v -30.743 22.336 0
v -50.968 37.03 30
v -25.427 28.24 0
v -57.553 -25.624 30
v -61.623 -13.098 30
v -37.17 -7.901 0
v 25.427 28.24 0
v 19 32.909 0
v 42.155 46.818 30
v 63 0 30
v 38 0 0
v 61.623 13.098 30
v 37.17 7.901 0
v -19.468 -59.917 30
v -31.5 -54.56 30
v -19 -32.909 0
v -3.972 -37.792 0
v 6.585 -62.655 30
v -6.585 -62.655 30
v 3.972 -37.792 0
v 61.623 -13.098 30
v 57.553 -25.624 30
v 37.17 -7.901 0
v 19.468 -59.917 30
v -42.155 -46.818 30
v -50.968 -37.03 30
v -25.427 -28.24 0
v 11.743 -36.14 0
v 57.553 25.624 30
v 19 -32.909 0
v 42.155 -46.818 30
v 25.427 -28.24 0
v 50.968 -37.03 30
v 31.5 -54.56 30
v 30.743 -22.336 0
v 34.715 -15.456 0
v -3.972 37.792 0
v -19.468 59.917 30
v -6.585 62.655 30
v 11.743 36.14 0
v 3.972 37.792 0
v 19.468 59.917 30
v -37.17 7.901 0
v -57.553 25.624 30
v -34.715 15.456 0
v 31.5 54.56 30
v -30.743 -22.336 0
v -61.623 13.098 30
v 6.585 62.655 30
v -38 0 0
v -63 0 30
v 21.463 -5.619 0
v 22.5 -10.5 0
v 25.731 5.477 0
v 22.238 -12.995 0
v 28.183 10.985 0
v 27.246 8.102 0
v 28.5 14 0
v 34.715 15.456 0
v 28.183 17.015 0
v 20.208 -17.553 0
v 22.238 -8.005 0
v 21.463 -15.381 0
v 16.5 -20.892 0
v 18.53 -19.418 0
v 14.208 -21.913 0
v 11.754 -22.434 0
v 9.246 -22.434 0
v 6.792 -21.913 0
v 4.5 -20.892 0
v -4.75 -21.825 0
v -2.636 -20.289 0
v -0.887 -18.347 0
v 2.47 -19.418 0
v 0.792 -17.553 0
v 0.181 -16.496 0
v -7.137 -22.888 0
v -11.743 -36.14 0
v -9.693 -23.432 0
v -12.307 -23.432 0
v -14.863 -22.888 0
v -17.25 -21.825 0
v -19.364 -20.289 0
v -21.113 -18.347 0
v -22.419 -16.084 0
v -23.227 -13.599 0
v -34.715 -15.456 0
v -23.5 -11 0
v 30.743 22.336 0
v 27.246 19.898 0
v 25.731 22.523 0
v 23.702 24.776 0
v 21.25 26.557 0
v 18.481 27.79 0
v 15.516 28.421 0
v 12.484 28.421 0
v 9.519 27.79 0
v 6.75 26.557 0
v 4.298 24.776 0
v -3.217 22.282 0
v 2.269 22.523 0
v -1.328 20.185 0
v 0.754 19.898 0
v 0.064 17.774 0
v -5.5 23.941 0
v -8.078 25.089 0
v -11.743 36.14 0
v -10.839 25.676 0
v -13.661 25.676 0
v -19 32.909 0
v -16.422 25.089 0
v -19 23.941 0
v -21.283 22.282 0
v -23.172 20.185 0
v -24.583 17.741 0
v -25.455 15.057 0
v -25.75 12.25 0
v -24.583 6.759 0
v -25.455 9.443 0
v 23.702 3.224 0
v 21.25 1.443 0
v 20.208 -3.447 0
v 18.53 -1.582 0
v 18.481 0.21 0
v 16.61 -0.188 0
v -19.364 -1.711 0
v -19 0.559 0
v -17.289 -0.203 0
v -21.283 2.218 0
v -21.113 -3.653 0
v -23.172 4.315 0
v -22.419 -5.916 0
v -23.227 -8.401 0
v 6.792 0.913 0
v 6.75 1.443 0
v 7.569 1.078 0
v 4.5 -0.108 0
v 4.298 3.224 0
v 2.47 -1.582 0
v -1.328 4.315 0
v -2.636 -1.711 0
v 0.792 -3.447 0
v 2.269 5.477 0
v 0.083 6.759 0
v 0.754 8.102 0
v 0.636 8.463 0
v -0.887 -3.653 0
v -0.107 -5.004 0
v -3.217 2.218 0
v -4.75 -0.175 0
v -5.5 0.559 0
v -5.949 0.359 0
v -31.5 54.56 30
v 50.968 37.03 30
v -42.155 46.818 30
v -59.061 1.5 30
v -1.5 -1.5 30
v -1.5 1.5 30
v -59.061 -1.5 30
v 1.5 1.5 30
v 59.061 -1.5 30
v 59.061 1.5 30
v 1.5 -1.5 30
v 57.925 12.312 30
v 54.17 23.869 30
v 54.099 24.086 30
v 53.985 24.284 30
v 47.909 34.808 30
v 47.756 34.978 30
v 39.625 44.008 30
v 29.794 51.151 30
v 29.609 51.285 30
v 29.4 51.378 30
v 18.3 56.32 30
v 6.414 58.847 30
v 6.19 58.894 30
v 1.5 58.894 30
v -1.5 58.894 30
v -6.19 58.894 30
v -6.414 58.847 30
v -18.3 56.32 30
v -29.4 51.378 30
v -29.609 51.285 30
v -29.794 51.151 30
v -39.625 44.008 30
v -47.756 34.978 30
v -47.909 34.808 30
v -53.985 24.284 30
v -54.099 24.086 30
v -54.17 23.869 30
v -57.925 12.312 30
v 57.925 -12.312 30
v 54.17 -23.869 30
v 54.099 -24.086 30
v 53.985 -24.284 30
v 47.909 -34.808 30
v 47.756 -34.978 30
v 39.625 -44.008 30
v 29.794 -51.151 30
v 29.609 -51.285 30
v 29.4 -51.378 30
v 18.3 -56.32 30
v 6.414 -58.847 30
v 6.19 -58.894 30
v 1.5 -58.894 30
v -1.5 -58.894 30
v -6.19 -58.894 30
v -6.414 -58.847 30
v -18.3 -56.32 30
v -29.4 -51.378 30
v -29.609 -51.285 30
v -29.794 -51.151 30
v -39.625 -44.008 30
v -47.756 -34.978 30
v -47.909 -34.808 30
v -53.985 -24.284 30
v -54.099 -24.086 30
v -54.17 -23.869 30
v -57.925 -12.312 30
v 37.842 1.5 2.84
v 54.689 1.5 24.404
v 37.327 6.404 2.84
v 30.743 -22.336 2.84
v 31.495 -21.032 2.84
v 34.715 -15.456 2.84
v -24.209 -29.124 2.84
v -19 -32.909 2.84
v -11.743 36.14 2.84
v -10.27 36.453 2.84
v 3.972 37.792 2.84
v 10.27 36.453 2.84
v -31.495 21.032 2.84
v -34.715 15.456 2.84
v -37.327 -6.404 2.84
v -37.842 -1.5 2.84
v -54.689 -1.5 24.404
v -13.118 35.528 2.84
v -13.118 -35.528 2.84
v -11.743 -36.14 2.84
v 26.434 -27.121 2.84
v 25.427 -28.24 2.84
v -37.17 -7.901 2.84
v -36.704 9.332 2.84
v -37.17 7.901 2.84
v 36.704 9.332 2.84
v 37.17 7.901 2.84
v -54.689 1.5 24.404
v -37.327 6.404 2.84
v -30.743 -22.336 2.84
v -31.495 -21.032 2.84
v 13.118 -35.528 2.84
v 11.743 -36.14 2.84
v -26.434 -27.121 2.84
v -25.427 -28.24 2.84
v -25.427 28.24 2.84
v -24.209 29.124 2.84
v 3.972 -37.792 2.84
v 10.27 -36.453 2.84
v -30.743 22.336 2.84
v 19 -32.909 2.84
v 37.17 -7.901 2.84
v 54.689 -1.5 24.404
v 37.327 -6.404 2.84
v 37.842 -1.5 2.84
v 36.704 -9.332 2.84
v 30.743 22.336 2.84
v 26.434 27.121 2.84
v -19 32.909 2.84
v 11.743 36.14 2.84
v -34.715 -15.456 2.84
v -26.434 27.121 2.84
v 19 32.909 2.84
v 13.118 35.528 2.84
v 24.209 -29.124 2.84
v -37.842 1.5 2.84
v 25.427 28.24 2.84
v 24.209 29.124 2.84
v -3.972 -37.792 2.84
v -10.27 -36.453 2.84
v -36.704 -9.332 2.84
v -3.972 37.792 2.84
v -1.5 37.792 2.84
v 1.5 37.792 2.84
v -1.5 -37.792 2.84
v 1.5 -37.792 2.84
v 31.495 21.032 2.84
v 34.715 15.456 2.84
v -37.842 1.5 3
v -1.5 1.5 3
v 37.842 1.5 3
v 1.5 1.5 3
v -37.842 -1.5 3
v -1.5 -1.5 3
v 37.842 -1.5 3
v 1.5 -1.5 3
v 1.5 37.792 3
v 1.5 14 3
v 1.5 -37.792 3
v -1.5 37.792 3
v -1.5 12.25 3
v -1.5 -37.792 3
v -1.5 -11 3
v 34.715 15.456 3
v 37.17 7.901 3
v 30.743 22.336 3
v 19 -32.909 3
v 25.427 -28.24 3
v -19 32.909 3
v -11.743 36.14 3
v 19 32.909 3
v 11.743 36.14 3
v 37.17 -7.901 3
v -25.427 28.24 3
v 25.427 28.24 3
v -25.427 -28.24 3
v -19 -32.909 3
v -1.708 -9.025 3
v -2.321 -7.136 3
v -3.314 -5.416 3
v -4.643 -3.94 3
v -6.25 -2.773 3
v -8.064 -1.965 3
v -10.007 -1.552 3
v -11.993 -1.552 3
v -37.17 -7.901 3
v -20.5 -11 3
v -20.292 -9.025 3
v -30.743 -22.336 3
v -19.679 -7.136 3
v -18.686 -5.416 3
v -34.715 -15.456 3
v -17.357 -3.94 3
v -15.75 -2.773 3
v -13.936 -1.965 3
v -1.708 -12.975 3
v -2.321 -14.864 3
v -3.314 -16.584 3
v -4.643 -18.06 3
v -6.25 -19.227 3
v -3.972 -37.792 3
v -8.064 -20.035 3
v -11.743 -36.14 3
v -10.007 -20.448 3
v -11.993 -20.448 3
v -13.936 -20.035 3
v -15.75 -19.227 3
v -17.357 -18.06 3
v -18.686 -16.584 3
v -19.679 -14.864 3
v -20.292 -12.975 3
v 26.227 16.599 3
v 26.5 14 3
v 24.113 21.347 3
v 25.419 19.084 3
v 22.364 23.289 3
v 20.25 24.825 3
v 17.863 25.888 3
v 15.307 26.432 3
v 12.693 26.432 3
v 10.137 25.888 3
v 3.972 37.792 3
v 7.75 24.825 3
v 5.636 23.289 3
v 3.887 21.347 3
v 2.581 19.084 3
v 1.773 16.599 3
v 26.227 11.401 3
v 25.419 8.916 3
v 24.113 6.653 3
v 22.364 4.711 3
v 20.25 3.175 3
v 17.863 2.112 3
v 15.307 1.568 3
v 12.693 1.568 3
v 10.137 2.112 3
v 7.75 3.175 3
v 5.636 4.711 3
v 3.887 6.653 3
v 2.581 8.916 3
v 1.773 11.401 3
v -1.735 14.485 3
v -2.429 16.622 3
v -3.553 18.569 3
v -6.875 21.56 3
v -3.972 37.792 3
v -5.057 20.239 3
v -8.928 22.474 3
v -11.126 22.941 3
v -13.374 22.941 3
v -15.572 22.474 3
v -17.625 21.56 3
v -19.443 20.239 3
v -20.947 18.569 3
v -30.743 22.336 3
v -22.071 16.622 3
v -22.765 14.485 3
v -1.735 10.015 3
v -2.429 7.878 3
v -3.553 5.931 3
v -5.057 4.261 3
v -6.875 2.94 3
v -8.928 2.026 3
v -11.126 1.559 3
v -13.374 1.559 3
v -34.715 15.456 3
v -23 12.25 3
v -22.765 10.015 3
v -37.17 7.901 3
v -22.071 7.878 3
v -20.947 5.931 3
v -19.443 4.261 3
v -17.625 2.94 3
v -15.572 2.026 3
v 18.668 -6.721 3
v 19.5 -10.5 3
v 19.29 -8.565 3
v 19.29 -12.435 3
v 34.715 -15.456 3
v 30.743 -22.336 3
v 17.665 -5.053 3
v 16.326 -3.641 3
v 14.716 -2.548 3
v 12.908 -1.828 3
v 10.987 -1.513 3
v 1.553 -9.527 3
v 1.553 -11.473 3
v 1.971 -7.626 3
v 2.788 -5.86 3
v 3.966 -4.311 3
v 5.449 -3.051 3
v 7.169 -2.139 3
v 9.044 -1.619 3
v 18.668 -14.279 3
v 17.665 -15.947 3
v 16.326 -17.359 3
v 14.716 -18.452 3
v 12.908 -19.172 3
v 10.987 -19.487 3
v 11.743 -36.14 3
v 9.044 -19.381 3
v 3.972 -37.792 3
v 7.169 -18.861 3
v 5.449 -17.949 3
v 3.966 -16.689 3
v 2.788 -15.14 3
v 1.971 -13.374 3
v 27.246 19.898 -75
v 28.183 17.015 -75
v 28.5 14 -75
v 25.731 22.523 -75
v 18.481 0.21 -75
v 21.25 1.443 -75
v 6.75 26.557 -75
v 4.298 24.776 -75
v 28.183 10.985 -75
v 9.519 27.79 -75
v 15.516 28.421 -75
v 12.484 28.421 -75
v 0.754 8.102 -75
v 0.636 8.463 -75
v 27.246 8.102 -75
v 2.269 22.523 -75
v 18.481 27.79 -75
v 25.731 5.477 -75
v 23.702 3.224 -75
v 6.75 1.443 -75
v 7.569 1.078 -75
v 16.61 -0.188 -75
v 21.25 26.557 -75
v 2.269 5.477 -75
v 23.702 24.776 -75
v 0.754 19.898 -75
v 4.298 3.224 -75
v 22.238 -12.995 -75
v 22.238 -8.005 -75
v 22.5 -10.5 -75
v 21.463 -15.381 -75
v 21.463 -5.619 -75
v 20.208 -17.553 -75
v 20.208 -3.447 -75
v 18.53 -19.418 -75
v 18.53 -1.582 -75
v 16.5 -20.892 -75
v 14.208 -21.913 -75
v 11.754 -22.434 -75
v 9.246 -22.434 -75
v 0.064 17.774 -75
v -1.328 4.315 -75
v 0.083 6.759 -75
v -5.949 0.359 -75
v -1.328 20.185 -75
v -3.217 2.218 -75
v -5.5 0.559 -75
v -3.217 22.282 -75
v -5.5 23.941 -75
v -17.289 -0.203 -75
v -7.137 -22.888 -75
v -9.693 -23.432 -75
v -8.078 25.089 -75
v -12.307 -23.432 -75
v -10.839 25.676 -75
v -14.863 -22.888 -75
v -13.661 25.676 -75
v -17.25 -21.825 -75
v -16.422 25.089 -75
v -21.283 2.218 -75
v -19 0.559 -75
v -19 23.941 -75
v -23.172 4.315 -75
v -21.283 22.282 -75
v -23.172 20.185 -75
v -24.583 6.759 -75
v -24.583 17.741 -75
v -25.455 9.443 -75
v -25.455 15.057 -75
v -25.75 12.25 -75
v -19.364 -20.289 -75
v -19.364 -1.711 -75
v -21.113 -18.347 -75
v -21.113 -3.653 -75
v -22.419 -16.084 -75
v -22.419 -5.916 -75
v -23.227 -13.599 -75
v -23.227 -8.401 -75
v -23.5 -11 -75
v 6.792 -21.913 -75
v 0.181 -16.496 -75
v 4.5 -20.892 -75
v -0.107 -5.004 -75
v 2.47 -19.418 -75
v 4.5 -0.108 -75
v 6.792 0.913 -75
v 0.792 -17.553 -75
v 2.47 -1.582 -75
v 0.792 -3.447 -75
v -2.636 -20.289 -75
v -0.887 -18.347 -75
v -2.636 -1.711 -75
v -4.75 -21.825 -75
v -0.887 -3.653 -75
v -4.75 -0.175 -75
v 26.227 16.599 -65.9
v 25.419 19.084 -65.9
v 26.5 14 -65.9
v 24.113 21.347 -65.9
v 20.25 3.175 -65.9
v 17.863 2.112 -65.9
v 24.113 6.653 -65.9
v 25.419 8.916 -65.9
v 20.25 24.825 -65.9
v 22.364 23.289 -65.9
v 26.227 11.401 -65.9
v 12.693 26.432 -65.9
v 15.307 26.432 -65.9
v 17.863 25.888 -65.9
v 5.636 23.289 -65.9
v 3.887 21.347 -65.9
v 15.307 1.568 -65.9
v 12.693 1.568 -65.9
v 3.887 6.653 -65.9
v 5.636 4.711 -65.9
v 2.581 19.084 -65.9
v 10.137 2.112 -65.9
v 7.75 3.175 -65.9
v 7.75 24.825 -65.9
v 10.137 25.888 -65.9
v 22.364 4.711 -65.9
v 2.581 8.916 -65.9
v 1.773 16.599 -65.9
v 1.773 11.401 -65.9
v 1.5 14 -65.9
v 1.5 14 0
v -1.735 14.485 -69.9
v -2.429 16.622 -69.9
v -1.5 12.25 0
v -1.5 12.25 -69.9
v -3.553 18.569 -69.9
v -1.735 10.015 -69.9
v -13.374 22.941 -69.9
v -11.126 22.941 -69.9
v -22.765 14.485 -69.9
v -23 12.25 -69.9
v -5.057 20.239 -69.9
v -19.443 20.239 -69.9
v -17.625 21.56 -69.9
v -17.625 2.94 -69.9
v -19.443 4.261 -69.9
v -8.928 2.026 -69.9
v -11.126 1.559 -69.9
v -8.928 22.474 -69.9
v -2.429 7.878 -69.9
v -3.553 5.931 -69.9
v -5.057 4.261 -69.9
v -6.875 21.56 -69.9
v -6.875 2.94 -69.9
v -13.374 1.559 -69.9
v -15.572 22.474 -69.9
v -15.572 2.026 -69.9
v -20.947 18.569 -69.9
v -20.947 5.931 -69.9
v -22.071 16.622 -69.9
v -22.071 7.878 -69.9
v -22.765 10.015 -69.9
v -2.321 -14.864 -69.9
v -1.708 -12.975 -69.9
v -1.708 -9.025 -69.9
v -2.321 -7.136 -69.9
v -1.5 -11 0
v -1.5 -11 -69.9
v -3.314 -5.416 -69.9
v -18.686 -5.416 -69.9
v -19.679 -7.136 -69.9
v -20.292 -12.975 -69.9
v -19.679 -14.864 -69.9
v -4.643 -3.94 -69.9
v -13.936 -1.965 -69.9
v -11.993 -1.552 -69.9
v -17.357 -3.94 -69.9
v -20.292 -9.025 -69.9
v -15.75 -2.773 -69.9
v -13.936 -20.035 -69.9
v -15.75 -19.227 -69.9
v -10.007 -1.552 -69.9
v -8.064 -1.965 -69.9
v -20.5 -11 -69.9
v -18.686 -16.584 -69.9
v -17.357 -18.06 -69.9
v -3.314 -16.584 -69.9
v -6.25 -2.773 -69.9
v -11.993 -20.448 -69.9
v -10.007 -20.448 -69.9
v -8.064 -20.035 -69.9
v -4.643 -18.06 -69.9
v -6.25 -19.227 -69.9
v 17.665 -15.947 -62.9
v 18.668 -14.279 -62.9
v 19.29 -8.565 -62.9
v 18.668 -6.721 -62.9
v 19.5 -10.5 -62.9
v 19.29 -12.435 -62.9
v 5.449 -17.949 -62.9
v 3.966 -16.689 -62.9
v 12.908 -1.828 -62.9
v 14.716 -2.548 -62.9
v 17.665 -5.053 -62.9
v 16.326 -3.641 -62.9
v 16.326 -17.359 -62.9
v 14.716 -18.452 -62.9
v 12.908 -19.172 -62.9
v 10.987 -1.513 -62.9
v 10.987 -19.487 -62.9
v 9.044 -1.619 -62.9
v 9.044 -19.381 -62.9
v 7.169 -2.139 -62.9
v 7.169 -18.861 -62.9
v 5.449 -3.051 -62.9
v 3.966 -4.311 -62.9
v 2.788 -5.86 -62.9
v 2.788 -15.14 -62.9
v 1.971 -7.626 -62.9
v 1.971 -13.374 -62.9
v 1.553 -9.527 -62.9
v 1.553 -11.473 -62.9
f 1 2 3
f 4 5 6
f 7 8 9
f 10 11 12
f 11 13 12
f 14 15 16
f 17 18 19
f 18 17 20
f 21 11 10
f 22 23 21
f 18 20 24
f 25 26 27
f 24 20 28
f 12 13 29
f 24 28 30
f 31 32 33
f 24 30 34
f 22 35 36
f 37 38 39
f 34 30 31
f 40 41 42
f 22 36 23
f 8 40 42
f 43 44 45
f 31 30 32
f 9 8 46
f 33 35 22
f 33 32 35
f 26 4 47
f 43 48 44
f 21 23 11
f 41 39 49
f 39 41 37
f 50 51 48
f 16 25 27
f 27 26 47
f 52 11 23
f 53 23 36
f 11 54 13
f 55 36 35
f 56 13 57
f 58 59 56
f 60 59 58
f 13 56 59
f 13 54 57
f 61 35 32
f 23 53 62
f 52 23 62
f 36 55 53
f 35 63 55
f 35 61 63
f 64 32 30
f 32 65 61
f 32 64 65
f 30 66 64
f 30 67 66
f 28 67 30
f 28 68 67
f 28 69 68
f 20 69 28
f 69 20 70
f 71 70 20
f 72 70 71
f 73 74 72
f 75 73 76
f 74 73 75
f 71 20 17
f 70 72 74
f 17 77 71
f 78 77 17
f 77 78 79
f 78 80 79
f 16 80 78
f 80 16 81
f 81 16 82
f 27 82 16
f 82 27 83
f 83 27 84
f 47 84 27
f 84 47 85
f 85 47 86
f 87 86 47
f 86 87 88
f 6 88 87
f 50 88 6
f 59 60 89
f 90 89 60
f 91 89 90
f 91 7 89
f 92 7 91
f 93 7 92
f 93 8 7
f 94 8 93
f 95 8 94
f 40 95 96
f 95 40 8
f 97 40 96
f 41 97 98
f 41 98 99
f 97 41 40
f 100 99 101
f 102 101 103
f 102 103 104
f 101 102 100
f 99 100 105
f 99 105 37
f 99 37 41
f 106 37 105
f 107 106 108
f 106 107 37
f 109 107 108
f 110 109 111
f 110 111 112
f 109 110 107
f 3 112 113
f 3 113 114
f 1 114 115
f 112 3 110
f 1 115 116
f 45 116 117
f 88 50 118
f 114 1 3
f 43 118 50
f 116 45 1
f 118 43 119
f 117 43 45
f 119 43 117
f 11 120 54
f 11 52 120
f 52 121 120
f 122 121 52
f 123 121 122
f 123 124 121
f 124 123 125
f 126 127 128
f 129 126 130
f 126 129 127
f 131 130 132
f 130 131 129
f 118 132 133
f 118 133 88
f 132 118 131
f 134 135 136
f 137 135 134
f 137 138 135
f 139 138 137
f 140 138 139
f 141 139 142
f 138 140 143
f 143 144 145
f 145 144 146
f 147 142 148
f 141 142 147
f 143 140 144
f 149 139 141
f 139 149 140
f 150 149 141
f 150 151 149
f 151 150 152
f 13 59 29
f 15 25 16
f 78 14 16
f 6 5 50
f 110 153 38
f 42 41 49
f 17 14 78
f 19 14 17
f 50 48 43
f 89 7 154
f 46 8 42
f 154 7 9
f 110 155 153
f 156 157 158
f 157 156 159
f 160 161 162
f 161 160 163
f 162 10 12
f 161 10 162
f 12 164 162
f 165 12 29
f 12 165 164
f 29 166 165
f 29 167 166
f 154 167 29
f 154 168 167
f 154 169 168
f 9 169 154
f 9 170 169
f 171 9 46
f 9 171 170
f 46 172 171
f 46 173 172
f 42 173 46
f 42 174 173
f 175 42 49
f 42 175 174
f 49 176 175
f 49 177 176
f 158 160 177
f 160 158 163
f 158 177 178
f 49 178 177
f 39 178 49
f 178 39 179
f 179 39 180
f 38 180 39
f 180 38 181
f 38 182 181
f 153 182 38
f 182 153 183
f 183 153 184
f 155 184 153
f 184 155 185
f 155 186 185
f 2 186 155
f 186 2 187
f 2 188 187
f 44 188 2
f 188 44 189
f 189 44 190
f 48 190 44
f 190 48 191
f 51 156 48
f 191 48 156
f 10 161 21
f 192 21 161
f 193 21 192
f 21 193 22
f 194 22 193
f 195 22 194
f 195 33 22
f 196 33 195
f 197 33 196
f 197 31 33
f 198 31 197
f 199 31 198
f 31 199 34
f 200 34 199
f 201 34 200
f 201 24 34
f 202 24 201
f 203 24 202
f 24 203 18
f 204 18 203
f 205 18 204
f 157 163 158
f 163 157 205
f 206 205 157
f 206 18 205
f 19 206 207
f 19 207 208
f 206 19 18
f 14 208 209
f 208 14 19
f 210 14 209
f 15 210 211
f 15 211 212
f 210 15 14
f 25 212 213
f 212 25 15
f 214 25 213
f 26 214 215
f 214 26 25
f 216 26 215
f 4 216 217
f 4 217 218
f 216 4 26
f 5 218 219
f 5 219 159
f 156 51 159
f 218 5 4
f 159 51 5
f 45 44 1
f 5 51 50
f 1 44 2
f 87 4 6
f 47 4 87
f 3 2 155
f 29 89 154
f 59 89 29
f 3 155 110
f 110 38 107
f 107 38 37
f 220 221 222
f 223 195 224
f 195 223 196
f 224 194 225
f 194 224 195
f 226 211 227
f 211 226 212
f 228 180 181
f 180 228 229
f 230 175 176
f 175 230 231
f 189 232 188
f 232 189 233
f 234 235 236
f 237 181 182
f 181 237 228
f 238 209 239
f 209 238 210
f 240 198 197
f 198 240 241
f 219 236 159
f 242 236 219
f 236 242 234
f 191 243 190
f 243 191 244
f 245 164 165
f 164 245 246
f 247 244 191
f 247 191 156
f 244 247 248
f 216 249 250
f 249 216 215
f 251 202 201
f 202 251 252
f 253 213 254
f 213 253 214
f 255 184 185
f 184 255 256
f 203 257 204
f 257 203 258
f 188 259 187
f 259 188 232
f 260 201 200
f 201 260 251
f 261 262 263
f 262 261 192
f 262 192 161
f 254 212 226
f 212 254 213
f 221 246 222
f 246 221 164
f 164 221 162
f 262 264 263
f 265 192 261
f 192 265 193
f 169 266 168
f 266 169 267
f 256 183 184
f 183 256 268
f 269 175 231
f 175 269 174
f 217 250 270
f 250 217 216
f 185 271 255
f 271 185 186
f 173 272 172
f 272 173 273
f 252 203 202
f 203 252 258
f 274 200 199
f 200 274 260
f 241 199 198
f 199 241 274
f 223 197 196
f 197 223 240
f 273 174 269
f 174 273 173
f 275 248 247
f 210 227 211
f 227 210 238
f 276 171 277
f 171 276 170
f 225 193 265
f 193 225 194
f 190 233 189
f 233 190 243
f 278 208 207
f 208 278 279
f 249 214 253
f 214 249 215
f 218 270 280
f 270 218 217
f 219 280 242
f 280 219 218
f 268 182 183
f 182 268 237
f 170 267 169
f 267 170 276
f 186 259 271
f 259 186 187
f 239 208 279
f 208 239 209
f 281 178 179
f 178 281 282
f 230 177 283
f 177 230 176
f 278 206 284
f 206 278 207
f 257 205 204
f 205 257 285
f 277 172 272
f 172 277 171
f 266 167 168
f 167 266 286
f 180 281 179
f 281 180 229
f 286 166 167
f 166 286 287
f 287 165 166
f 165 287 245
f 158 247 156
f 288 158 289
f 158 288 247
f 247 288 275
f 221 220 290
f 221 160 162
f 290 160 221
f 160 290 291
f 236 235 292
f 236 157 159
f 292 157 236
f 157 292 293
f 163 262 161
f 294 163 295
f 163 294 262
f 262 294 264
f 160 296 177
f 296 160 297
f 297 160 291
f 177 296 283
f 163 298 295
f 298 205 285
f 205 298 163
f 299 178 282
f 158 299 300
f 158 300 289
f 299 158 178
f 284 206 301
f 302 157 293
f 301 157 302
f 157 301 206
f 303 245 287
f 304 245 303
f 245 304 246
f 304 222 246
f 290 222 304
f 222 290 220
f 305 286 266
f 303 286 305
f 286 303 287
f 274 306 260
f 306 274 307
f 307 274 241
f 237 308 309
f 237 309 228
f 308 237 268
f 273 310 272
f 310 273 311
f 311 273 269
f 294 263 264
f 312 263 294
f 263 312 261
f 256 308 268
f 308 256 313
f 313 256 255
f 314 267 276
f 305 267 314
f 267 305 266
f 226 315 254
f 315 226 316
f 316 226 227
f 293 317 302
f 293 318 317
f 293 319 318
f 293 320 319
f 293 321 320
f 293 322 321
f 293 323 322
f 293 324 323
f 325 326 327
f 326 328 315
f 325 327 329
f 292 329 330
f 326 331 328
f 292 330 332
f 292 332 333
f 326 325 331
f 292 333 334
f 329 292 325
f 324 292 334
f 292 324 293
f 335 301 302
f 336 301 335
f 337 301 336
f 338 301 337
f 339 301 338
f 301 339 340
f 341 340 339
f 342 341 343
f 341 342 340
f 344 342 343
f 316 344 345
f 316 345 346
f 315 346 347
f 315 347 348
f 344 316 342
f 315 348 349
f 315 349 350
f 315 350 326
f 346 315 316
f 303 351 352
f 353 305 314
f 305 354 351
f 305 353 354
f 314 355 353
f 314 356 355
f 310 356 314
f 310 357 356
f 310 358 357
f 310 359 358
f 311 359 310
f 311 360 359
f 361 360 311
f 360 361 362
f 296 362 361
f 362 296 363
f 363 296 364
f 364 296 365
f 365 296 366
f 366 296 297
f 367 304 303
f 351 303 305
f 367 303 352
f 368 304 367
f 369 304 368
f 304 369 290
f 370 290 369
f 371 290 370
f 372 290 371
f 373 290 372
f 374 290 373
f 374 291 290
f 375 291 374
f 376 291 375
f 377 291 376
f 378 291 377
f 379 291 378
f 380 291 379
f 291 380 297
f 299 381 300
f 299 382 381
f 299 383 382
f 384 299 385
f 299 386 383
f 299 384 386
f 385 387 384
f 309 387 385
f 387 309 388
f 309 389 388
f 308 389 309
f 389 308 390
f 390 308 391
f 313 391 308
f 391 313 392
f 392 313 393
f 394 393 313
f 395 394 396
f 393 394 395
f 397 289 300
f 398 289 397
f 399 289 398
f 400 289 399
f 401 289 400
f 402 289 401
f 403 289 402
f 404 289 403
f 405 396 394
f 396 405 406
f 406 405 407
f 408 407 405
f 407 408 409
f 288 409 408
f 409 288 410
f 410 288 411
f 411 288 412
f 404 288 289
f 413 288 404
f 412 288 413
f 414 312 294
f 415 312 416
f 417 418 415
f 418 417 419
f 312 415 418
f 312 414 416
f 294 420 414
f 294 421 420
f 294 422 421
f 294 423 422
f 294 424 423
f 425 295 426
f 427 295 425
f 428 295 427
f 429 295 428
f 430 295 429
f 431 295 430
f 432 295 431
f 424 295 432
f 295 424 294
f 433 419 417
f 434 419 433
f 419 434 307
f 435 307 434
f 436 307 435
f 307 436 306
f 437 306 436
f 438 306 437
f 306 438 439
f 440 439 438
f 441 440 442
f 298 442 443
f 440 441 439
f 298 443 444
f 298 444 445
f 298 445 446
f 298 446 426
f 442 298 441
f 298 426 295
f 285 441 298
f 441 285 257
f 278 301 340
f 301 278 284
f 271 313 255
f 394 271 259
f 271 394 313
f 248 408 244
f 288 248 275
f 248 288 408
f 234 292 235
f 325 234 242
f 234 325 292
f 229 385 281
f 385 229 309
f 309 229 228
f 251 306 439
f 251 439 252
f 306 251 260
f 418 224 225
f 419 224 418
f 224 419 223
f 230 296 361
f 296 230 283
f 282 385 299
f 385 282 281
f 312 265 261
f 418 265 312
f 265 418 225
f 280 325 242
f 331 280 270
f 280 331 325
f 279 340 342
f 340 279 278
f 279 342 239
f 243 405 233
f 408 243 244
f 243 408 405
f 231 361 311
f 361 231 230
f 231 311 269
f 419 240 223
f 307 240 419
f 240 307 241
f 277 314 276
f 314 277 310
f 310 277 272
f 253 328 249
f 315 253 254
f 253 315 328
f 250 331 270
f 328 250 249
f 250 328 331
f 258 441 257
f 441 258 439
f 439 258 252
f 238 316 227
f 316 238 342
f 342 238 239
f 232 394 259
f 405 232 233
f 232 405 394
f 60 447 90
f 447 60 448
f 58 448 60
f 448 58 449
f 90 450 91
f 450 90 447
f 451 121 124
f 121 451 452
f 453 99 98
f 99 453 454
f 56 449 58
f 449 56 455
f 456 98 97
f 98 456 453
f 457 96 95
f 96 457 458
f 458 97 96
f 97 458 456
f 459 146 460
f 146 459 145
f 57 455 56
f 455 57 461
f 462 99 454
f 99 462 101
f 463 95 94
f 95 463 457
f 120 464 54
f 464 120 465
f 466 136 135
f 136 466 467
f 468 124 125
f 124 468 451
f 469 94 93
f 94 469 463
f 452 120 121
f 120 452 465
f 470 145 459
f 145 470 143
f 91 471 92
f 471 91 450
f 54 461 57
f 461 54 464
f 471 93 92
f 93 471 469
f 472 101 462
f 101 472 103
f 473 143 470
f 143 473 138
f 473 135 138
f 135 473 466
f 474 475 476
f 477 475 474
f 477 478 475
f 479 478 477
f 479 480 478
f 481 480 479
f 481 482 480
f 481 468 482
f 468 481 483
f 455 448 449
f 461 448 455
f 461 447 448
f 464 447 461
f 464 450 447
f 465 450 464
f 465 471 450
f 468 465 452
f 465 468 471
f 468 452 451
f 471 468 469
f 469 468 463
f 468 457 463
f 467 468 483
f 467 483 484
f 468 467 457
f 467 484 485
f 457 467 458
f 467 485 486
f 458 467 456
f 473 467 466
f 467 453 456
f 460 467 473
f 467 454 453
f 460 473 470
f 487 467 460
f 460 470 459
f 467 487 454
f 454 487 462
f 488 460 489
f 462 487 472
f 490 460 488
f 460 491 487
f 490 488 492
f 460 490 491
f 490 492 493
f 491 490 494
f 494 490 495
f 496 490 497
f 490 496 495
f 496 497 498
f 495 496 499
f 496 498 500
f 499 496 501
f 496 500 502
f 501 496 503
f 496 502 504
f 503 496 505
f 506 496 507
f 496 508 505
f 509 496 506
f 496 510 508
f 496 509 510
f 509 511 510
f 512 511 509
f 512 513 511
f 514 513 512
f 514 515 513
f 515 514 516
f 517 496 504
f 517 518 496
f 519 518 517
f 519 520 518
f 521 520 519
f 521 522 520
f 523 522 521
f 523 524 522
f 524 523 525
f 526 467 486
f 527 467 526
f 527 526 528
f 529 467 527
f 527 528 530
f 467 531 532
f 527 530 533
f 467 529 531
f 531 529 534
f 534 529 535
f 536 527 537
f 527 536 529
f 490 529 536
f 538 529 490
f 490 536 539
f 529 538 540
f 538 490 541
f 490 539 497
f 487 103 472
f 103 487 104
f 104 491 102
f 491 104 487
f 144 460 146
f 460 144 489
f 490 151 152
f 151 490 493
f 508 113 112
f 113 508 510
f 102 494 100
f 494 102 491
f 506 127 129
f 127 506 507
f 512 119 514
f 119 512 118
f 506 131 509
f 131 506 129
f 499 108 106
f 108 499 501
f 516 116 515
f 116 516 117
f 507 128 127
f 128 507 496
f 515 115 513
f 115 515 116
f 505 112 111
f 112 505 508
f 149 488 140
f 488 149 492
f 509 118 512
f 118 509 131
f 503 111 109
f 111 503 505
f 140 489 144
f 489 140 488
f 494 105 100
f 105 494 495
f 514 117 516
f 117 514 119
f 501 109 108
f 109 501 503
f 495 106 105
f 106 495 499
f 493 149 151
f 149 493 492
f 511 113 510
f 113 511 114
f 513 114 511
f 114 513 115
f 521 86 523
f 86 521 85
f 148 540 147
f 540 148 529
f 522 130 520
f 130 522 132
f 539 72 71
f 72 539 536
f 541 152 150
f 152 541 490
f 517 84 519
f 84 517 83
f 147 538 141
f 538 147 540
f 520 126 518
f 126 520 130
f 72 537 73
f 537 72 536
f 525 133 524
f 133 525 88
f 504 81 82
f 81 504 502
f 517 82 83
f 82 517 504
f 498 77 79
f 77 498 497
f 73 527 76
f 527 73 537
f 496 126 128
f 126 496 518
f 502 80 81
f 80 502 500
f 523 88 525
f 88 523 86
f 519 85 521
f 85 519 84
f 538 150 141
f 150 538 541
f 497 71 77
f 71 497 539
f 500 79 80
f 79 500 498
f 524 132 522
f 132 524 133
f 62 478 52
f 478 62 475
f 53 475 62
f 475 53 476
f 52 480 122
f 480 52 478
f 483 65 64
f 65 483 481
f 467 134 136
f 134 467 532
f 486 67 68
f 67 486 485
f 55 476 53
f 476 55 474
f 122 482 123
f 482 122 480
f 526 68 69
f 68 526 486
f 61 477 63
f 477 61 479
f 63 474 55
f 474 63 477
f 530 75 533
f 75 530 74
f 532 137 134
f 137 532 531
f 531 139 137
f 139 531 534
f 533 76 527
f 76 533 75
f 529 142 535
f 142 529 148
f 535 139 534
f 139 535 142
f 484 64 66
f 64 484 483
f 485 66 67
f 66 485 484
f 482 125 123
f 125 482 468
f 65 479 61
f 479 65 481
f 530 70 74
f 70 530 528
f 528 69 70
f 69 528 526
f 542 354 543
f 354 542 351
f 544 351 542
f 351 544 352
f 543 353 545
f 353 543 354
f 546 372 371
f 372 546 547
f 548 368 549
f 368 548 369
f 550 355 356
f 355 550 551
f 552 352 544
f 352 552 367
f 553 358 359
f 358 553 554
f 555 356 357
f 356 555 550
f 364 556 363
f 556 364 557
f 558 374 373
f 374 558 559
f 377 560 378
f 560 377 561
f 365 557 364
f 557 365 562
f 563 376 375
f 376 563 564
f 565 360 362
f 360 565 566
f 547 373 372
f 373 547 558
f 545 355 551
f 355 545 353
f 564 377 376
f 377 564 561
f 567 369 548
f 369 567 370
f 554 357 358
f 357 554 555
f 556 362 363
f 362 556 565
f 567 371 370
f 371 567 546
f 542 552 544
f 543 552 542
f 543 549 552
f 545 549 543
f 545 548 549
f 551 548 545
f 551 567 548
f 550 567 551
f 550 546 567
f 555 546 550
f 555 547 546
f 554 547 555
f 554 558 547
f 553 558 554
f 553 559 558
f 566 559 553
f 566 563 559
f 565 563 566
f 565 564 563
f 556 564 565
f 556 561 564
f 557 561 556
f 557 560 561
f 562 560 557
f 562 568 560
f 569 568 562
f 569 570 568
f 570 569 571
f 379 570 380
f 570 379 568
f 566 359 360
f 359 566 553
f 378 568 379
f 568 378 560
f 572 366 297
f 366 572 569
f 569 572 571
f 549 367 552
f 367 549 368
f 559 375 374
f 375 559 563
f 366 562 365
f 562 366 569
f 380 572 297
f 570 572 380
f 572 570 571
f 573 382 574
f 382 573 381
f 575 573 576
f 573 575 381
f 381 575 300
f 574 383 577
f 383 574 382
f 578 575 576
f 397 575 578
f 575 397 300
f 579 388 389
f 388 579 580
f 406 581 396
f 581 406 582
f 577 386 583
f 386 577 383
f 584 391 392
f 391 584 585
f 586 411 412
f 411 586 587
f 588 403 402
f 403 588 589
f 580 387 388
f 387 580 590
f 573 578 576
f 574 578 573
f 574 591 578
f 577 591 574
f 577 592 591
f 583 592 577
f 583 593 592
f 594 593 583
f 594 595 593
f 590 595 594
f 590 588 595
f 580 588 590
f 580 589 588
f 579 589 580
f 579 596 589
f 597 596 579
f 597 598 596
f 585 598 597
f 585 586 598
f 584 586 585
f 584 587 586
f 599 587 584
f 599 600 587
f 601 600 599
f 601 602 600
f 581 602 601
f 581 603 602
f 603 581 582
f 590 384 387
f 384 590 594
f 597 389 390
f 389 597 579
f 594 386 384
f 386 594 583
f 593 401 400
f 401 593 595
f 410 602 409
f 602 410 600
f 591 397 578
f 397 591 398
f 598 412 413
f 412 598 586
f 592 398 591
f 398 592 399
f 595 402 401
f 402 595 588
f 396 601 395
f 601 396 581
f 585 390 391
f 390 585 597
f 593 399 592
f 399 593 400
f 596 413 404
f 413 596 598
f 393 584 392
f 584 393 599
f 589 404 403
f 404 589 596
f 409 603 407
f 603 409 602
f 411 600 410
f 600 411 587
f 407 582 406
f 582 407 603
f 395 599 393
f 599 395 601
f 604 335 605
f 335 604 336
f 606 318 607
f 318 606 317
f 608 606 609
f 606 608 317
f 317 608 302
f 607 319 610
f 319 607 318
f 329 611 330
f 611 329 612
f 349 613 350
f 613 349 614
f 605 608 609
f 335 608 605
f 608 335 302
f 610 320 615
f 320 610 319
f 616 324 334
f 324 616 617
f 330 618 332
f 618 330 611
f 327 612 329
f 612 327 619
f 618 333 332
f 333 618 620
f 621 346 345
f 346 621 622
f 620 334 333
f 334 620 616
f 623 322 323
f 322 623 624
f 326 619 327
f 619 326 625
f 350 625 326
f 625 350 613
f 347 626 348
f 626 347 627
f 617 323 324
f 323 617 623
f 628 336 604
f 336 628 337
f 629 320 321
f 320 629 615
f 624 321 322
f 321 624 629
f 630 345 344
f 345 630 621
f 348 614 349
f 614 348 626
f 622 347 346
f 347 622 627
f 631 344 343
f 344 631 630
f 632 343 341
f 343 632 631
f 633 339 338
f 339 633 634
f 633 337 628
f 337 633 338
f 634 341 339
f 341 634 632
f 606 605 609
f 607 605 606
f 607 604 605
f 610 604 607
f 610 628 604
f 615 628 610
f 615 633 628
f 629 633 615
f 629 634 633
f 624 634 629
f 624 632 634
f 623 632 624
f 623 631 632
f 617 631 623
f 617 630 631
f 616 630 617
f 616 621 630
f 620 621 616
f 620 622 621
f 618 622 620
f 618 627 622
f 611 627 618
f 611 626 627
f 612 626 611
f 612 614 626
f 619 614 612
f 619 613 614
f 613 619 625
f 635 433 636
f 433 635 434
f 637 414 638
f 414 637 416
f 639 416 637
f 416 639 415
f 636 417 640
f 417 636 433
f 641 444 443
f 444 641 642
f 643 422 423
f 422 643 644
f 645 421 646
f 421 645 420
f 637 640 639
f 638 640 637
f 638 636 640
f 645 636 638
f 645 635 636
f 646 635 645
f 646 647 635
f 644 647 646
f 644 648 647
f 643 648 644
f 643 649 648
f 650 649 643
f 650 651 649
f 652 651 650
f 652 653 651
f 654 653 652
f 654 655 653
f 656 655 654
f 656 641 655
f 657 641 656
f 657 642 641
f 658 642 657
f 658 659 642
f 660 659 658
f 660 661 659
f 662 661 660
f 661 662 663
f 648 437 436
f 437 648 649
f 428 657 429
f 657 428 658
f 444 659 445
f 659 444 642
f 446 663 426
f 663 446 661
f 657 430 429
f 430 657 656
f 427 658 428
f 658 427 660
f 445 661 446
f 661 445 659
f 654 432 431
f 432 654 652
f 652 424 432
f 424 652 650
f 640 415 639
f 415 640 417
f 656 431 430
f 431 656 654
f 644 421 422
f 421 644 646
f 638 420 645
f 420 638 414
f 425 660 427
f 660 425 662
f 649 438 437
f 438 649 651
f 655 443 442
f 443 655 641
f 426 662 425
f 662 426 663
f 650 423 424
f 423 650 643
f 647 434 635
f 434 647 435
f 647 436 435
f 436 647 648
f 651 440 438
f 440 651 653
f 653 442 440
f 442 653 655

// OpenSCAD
DQ=25; //diameter of quarters
HQ=69; //height of $10 of quarters

DN=21.5; //diameter of nickles
HN=73; //height of $2 of nickles

DP=19; //diameter of pennies
HP=73; //height of $.5 of pennies

DD=18; //diameter of dimes
HD=66; //height of $5 of dimes

union() {
 difference() {
 cylinder(h=30, r1=38, r2=63, center=false);
 translate([0,0,-1])
 cylinder(h=32, r1=35, r2=60, center=false);
 } //catcher cone
 
 
 intersection() {
 cylinder(h=30, r1=38, r2=63, center=false);
 
 translate([0,0,15])
 cube(size = [125,3,30], center = true);
 }
 intersection() {
 cylinder(h=30, r1=38, r2=63, center=false);
  
 translate([0,0,15])
 cube(size = [3,125,30], center = true);
 }
  // dividers
 
 difference() {
 union() {
 cylinder(h=3, r=38, center=false);

 translate([(DQ/2)+1.5,(DQ/2)+1.5,-75])
 cylinder(h=75, r=(DQ+4)/2, center=false); //.25
 
 translate([-(DN/2)-1.5,(DN/2)+1.5,-75])
 cylinder(h=75, r=13.5, center=false); //.5
 
 translate([-(DP/2)-1.5,-(DP/2)-1.5,-75])
 cylinder(h=75, r=12.5, center=false); //.01
 
 translate([(DD/2)+1.5,-(DD/2)-1.5,-75])
 cylinder(h=75, r=12, center=false); //.1
 } //outer
 translate([(DQ/2)+1.5,(DQ/2)+1.5,-HQ+3.1])
 cylinder(h=HQ, r=DQ/2, center=false); //.25
 
 translate([-(DN/2)-1.5,(DN/2)+1.5,-HN+3.1])
 cylinder(h=HN, r=DN/2, center=false); //.5
 
 translate([-(DP/2)-1.5,-(DP/2)-1.5,-HP+3.1])
 cylinder(h=HP, r=DP/2, center=false); //.01
 
 translate([(DD/2)+1.5,-(DD/2)-1.5,-HD+3.1])
 cylinder(h=HD, r=DD/2, center=false); //.1
 } //inner
 }
